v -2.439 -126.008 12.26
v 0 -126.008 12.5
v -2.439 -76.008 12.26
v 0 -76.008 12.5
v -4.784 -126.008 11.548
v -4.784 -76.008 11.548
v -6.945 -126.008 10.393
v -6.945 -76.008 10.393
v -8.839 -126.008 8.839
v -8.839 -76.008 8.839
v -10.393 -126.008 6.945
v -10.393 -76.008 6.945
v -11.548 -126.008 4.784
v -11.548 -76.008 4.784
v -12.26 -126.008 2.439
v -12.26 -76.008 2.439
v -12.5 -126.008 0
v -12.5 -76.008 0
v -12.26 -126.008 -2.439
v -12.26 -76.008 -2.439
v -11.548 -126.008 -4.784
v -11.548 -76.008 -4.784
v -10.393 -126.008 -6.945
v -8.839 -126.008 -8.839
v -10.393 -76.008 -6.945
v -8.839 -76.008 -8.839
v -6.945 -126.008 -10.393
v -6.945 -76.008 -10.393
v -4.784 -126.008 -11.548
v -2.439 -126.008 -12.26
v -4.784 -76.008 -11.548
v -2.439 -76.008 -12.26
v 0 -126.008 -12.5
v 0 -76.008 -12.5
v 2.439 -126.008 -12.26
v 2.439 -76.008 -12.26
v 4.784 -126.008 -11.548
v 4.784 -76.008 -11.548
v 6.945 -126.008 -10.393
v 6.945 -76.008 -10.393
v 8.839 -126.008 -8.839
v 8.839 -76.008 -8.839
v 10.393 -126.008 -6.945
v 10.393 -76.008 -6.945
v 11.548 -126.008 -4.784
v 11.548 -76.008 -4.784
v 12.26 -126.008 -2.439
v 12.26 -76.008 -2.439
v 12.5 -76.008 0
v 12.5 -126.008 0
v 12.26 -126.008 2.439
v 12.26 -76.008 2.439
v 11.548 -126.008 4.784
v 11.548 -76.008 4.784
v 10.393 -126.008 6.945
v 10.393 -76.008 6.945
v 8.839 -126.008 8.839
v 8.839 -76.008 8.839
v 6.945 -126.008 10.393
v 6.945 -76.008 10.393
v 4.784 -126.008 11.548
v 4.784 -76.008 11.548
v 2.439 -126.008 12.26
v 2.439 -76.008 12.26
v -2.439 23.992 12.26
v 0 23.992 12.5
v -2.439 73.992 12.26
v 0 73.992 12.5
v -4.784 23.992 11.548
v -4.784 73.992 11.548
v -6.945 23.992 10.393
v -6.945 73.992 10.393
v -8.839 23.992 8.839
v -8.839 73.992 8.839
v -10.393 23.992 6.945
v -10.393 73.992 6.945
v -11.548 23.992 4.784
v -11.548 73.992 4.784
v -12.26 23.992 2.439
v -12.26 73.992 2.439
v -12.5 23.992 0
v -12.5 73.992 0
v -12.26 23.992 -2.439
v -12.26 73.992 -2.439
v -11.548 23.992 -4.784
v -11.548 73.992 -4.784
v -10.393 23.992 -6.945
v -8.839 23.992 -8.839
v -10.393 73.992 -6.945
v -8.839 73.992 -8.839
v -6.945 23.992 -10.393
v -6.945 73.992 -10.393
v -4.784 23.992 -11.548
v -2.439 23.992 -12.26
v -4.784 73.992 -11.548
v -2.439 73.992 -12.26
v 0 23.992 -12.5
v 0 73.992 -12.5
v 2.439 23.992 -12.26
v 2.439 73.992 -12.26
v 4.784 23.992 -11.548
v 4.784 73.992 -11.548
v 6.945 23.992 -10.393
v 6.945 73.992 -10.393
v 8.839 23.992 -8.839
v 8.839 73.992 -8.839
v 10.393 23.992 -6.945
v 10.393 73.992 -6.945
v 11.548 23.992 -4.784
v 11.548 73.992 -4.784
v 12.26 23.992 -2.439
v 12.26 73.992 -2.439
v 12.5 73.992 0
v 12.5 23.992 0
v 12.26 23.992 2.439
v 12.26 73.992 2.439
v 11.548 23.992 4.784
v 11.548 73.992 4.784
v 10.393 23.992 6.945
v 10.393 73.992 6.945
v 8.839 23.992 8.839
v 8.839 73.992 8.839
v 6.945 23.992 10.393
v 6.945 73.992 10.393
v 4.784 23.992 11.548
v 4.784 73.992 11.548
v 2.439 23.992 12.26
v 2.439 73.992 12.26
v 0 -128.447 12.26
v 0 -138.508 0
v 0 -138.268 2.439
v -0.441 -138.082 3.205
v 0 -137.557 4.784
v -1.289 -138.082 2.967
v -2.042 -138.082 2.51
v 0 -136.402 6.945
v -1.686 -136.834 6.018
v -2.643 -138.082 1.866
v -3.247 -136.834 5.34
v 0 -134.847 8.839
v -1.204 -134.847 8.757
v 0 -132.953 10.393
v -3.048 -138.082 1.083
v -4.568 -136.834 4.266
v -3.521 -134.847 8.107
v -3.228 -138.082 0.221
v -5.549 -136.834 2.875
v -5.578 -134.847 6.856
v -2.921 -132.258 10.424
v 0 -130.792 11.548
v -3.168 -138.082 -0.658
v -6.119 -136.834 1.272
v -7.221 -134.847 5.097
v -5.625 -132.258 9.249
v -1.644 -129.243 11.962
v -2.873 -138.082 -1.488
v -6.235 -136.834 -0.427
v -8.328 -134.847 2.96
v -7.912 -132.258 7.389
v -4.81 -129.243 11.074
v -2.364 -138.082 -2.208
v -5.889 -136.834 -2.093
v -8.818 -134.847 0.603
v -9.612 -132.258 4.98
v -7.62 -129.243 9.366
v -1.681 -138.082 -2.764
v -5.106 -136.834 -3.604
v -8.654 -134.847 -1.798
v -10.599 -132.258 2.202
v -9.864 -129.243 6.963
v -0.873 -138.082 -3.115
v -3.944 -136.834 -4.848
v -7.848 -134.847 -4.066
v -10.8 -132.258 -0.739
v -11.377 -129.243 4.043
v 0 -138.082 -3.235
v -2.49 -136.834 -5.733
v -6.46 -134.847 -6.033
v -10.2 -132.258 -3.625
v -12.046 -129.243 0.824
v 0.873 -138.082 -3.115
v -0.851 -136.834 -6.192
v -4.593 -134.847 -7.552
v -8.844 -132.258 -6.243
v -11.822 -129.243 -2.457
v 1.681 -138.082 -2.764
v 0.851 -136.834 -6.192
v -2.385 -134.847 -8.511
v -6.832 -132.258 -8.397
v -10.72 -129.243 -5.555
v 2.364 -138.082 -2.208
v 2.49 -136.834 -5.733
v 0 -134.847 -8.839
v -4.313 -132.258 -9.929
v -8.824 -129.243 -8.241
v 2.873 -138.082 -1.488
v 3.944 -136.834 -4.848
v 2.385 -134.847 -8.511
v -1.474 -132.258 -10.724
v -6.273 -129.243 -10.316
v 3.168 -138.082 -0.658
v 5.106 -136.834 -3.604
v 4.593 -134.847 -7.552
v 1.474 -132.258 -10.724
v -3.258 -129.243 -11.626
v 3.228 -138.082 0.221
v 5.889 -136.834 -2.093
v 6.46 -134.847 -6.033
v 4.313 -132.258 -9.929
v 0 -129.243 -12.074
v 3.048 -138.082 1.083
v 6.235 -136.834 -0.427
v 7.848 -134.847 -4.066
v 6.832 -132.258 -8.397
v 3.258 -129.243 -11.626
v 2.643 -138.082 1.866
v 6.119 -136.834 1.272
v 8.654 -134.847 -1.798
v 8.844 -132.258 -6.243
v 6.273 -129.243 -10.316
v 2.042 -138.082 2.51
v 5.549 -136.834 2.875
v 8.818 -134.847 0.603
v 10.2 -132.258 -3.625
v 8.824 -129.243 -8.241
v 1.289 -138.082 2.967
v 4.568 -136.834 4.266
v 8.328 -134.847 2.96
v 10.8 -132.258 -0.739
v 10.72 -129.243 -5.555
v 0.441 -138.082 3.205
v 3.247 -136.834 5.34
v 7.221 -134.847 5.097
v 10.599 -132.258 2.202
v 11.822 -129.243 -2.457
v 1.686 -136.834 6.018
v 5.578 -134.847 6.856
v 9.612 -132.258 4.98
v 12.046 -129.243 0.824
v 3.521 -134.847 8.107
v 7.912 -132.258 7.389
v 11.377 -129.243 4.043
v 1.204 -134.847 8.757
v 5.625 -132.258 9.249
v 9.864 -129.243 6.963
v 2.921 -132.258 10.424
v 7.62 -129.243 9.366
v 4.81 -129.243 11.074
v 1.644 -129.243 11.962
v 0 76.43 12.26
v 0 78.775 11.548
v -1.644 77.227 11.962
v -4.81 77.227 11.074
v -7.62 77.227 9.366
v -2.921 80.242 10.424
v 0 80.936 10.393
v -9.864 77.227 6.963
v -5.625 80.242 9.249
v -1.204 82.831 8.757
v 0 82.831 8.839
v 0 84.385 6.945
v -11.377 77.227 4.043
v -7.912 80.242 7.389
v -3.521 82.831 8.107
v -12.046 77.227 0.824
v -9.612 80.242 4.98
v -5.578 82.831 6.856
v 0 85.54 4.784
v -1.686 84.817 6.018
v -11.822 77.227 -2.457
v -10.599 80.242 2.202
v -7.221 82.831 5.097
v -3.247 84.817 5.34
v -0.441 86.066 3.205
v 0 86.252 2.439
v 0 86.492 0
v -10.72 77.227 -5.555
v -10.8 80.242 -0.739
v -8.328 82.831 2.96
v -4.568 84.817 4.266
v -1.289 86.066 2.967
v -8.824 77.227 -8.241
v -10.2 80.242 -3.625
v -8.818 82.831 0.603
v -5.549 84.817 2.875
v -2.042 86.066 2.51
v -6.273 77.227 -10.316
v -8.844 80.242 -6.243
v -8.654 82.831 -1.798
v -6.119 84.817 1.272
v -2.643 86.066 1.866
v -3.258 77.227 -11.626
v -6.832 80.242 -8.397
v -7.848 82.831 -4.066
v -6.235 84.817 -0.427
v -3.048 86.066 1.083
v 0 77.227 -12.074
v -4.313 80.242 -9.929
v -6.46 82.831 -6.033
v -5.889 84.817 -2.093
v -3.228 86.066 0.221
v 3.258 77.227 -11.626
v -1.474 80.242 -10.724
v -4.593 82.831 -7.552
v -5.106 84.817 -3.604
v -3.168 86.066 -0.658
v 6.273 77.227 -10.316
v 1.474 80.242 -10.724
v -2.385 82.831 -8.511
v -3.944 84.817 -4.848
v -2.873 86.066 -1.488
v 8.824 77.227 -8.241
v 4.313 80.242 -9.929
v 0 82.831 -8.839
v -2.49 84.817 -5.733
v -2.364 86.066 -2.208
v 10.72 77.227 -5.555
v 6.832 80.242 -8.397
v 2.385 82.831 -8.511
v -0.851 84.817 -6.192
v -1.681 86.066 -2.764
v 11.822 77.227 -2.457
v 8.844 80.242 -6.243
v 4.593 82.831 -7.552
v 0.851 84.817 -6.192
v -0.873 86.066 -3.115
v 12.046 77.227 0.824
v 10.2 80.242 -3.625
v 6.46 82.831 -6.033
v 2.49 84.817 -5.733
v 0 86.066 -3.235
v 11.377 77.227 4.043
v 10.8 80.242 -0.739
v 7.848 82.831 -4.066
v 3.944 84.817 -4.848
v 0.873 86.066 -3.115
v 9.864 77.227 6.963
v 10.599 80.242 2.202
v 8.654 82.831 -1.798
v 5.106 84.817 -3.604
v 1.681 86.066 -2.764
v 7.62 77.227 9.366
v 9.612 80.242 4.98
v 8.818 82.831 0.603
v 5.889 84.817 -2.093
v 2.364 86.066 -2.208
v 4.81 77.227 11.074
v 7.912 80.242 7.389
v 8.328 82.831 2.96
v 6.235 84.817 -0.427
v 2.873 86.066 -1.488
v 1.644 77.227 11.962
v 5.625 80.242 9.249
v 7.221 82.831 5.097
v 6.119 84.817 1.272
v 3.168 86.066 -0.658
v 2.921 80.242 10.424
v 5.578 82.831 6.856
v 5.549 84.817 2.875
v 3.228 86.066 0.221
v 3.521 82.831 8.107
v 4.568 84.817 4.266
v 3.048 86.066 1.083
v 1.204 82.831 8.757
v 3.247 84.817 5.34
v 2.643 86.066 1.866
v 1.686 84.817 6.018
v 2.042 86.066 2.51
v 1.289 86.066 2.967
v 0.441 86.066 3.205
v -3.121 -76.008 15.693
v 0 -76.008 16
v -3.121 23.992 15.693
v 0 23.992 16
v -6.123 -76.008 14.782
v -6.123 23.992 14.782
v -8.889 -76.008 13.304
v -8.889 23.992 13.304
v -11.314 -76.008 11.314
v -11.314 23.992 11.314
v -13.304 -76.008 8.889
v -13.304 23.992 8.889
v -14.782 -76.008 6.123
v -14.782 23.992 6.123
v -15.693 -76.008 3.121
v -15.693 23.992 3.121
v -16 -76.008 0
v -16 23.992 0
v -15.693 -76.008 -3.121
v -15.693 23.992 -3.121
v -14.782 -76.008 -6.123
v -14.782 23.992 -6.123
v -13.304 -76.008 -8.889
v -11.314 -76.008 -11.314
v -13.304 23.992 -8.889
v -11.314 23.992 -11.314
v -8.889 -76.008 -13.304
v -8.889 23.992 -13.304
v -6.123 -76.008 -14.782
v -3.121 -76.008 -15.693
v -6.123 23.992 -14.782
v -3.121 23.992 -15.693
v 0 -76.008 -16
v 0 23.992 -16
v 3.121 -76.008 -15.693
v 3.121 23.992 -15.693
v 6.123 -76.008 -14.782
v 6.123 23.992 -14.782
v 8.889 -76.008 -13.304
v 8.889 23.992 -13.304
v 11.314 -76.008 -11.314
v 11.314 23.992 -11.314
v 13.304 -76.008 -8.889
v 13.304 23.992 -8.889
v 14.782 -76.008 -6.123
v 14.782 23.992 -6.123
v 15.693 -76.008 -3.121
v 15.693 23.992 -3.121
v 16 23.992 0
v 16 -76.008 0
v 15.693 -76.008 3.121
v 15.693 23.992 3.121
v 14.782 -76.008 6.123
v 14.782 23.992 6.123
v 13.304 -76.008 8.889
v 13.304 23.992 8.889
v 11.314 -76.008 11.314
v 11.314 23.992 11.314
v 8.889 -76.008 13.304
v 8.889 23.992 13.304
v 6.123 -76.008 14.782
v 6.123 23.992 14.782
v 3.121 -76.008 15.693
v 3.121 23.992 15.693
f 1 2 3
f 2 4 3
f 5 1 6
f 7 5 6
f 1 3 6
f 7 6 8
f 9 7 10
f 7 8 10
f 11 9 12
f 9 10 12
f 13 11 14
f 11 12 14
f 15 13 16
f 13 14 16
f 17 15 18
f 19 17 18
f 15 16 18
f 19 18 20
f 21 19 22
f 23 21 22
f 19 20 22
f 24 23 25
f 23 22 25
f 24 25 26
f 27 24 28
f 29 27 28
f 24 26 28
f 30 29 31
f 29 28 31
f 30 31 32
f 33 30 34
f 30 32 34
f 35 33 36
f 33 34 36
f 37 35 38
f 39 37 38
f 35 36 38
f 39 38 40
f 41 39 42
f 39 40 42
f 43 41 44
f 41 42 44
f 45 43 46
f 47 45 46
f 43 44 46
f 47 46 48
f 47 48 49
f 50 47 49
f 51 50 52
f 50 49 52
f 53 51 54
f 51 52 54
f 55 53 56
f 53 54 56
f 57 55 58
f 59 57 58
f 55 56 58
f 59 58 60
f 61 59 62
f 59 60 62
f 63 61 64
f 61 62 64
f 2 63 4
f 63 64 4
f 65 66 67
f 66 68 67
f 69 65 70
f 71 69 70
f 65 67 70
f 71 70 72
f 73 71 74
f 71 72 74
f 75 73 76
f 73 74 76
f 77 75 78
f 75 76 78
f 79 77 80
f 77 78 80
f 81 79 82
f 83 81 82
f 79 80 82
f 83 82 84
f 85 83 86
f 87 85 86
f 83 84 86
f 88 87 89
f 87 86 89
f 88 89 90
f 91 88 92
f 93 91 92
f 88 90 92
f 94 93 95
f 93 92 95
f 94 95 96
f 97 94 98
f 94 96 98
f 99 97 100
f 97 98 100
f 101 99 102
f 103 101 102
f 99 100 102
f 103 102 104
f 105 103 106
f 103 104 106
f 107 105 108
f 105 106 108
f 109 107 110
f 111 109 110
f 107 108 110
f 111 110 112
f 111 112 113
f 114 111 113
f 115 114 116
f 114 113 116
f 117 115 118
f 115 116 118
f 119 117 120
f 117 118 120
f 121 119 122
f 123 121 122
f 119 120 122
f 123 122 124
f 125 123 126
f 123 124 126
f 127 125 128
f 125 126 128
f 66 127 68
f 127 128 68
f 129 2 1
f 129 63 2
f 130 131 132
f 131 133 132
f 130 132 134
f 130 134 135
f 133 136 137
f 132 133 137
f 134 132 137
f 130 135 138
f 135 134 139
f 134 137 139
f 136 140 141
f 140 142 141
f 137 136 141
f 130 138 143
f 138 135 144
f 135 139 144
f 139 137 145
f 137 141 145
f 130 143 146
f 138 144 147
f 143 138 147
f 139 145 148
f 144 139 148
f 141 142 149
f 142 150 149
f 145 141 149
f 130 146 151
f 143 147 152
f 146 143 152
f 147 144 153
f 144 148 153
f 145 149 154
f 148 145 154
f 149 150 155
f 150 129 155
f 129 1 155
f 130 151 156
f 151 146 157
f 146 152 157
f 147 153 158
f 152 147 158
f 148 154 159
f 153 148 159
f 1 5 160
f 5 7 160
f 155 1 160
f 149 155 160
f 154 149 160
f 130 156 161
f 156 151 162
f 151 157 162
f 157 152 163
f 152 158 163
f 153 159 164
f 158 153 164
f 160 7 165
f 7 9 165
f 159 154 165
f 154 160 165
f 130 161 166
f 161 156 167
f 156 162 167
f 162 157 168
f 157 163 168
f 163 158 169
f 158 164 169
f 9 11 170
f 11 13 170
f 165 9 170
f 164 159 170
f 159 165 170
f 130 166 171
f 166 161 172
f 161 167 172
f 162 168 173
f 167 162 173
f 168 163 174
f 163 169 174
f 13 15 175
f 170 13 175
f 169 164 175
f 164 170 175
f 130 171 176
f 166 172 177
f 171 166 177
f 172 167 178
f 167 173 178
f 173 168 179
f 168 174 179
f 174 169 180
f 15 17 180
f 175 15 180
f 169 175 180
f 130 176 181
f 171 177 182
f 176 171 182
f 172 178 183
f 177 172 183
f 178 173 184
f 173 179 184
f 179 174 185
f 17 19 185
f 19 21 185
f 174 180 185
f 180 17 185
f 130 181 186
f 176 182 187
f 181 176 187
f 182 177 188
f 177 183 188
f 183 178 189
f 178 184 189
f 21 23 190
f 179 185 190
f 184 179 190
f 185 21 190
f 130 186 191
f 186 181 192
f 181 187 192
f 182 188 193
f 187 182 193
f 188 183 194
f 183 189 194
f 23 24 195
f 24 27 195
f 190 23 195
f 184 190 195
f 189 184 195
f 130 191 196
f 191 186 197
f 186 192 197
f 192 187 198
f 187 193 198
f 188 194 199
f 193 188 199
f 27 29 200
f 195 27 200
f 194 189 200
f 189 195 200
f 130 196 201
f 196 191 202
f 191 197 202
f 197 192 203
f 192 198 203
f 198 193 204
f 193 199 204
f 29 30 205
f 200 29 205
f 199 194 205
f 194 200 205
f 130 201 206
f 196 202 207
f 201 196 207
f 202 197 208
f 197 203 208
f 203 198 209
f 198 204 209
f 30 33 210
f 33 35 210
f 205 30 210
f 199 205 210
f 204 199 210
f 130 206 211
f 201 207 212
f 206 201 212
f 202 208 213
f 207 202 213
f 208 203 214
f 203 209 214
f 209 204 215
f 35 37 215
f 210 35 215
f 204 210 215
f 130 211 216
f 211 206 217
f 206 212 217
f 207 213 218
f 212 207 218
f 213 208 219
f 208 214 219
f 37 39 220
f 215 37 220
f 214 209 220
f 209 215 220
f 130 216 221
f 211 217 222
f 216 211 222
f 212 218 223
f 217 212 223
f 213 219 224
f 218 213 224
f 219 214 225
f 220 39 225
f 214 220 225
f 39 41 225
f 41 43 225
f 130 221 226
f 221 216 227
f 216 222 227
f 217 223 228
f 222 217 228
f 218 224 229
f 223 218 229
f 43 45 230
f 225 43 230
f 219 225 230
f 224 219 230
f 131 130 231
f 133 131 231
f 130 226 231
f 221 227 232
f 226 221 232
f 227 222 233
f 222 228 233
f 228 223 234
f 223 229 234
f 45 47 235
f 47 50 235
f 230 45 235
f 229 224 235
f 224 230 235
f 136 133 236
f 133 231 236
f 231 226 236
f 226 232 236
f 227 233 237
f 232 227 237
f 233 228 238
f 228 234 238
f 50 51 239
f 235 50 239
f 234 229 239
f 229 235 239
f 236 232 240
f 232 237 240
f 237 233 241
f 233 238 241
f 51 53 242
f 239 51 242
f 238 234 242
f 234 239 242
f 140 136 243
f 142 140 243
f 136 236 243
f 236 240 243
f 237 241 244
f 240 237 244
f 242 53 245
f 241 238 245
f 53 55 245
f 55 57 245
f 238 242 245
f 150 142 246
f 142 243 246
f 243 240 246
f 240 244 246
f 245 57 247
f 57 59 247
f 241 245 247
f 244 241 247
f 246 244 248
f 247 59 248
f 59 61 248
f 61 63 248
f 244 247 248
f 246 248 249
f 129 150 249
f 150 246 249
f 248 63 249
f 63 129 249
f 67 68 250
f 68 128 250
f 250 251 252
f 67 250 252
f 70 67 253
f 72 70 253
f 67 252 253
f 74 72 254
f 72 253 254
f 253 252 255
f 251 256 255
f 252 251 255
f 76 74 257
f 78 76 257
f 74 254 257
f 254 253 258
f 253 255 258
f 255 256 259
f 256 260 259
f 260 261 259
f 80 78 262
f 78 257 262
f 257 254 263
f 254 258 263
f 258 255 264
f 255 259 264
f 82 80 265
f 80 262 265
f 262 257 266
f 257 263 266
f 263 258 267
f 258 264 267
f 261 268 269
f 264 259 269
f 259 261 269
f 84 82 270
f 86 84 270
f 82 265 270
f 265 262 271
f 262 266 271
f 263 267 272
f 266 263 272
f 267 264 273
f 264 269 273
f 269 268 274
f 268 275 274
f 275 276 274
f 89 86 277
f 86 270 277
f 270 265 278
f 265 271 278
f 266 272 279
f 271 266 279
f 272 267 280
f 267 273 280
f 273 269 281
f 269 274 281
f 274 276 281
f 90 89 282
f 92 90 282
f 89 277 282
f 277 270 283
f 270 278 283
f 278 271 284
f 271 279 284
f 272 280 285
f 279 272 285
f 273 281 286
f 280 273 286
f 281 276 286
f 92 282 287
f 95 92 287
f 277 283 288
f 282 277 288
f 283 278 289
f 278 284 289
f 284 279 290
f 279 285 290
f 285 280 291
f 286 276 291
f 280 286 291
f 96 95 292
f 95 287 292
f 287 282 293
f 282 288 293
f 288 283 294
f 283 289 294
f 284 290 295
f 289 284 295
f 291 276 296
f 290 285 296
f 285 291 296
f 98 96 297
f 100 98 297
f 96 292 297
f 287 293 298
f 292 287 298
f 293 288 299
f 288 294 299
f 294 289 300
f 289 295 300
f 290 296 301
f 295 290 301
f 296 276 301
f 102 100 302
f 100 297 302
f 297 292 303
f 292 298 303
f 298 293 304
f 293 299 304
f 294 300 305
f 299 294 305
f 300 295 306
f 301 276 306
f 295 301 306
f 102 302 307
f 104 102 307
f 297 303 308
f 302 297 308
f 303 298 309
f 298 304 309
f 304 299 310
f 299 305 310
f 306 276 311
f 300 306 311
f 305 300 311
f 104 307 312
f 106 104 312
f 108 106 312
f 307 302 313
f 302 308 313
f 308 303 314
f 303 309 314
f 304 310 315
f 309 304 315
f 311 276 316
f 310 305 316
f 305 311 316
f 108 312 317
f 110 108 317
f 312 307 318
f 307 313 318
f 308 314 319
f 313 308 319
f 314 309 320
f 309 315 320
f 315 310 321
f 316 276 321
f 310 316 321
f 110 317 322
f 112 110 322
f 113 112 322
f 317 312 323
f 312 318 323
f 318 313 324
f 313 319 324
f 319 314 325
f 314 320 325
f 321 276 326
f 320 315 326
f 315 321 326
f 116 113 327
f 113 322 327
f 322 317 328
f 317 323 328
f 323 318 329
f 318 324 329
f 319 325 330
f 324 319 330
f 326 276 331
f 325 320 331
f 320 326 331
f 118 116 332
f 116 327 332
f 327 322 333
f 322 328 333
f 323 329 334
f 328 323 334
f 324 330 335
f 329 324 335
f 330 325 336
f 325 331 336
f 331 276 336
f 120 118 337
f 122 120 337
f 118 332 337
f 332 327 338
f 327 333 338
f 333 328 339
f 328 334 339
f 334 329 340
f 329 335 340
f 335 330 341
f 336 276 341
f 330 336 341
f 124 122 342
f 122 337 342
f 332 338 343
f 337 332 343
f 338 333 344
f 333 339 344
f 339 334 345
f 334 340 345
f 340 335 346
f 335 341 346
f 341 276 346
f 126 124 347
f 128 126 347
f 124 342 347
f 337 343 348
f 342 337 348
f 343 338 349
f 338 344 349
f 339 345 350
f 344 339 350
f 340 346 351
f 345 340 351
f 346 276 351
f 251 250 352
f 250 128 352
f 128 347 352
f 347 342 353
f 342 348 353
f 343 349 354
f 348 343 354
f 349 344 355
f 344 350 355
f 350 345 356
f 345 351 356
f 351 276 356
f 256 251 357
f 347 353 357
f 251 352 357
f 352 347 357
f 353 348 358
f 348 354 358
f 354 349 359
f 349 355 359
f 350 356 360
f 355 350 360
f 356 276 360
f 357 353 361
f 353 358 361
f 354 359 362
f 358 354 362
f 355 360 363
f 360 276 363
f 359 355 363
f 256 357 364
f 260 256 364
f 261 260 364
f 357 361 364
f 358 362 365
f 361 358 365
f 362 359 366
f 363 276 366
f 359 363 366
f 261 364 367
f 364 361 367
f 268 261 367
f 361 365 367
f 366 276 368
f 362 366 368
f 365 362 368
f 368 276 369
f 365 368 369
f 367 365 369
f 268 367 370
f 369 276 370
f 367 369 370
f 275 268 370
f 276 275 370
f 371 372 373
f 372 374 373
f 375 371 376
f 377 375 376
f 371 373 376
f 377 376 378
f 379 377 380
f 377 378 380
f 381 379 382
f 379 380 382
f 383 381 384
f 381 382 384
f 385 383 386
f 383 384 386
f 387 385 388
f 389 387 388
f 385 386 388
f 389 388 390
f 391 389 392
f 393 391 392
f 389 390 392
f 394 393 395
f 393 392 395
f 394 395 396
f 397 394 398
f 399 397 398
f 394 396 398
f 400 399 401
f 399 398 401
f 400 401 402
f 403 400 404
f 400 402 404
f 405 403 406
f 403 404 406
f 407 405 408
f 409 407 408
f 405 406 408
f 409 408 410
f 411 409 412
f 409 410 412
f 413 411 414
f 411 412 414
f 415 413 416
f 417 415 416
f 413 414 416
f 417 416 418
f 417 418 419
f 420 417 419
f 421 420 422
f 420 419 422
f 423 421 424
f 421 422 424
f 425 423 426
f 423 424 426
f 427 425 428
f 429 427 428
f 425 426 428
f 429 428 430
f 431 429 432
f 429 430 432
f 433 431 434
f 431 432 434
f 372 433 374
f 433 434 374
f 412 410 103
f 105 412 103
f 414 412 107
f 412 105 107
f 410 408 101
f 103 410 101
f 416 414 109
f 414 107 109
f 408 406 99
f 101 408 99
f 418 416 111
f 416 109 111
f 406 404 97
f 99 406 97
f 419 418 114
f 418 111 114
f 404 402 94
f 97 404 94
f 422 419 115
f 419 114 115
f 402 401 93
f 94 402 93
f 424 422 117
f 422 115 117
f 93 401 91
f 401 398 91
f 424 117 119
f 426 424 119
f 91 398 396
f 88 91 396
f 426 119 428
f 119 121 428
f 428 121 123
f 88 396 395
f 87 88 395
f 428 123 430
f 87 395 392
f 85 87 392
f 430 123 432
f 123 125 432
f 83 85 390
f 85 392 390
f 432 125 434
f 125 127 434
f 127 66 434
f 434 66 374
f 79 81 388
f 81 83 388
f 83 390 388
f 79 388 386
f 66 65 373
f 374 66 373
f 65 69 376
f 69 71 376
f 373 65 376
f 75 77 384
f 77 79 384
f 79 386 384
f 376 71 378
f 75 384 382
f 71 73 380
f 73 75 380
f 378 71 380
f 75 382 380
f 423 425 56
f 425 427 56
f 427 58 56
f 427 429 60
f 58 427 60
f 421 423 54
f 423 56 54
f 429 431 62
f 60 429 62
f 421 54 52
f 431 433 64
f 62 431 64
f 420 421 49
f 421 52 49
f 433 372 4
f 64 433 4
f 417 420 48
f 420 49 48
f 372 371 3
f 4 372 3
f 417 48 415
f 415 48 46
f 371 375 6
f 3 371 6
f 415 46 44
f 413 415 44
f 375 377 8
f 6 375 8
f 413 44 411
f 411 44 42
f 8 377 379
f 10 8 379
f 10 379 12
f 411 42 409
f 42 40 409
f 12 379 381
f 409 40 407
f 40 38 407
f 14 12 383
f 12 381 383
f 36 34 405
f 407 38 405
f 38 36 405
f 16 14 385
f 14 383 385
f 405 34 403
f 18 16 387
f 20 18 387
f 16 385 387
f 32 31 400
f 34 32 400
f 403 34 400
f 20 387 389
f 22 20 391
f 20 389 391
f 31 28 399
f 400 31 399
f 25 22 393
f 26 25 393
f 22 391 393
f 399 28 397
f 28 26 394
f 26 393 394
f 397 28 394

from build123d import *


with BuildPart() as part:
    # Sketch1 → Revolve1 (revolve)
    with BuildSketch(Plane.XY, mode=Mode.PRIVATE) as revolve1_sk:
        Polygon((12.5, 73.991760417), (0, 73.991760417), (0, -126.008239583), (12.5, -126.008239583), (12.5, -76.008239583), (16, -76.008239583), (16, 23.991760417), (12.5, 23.991760417), align=None)
        with BuildLine():
            Line((0, 86.491760417), (0, 73.991760417))
            Line((0, 73.991760417), (12.5, 73.991760417))
            ThreePointArc((12.5, 73.991760417), (8.838834765, 82.830595182), (0, 86.491760417))
        make_face()
        with BuildLine():
            Line((12.5, -126.008239583), (0, -126.008239583))
            Line((0, -126.008239583), (0, -138.508239583))
            ThreePointArc((0, -138.508239583), (8.838834765, -134.847074348), (12.5, -126.008239583))
        make_face()
    revolve(revolve1_sk.sketch.rotate(Axis((0, 86.491760417, 0), (0, -1, 0)), 90), axis=Axis((0, 86.491760417, 0), (0, -1, 0)))


solid = part.part
